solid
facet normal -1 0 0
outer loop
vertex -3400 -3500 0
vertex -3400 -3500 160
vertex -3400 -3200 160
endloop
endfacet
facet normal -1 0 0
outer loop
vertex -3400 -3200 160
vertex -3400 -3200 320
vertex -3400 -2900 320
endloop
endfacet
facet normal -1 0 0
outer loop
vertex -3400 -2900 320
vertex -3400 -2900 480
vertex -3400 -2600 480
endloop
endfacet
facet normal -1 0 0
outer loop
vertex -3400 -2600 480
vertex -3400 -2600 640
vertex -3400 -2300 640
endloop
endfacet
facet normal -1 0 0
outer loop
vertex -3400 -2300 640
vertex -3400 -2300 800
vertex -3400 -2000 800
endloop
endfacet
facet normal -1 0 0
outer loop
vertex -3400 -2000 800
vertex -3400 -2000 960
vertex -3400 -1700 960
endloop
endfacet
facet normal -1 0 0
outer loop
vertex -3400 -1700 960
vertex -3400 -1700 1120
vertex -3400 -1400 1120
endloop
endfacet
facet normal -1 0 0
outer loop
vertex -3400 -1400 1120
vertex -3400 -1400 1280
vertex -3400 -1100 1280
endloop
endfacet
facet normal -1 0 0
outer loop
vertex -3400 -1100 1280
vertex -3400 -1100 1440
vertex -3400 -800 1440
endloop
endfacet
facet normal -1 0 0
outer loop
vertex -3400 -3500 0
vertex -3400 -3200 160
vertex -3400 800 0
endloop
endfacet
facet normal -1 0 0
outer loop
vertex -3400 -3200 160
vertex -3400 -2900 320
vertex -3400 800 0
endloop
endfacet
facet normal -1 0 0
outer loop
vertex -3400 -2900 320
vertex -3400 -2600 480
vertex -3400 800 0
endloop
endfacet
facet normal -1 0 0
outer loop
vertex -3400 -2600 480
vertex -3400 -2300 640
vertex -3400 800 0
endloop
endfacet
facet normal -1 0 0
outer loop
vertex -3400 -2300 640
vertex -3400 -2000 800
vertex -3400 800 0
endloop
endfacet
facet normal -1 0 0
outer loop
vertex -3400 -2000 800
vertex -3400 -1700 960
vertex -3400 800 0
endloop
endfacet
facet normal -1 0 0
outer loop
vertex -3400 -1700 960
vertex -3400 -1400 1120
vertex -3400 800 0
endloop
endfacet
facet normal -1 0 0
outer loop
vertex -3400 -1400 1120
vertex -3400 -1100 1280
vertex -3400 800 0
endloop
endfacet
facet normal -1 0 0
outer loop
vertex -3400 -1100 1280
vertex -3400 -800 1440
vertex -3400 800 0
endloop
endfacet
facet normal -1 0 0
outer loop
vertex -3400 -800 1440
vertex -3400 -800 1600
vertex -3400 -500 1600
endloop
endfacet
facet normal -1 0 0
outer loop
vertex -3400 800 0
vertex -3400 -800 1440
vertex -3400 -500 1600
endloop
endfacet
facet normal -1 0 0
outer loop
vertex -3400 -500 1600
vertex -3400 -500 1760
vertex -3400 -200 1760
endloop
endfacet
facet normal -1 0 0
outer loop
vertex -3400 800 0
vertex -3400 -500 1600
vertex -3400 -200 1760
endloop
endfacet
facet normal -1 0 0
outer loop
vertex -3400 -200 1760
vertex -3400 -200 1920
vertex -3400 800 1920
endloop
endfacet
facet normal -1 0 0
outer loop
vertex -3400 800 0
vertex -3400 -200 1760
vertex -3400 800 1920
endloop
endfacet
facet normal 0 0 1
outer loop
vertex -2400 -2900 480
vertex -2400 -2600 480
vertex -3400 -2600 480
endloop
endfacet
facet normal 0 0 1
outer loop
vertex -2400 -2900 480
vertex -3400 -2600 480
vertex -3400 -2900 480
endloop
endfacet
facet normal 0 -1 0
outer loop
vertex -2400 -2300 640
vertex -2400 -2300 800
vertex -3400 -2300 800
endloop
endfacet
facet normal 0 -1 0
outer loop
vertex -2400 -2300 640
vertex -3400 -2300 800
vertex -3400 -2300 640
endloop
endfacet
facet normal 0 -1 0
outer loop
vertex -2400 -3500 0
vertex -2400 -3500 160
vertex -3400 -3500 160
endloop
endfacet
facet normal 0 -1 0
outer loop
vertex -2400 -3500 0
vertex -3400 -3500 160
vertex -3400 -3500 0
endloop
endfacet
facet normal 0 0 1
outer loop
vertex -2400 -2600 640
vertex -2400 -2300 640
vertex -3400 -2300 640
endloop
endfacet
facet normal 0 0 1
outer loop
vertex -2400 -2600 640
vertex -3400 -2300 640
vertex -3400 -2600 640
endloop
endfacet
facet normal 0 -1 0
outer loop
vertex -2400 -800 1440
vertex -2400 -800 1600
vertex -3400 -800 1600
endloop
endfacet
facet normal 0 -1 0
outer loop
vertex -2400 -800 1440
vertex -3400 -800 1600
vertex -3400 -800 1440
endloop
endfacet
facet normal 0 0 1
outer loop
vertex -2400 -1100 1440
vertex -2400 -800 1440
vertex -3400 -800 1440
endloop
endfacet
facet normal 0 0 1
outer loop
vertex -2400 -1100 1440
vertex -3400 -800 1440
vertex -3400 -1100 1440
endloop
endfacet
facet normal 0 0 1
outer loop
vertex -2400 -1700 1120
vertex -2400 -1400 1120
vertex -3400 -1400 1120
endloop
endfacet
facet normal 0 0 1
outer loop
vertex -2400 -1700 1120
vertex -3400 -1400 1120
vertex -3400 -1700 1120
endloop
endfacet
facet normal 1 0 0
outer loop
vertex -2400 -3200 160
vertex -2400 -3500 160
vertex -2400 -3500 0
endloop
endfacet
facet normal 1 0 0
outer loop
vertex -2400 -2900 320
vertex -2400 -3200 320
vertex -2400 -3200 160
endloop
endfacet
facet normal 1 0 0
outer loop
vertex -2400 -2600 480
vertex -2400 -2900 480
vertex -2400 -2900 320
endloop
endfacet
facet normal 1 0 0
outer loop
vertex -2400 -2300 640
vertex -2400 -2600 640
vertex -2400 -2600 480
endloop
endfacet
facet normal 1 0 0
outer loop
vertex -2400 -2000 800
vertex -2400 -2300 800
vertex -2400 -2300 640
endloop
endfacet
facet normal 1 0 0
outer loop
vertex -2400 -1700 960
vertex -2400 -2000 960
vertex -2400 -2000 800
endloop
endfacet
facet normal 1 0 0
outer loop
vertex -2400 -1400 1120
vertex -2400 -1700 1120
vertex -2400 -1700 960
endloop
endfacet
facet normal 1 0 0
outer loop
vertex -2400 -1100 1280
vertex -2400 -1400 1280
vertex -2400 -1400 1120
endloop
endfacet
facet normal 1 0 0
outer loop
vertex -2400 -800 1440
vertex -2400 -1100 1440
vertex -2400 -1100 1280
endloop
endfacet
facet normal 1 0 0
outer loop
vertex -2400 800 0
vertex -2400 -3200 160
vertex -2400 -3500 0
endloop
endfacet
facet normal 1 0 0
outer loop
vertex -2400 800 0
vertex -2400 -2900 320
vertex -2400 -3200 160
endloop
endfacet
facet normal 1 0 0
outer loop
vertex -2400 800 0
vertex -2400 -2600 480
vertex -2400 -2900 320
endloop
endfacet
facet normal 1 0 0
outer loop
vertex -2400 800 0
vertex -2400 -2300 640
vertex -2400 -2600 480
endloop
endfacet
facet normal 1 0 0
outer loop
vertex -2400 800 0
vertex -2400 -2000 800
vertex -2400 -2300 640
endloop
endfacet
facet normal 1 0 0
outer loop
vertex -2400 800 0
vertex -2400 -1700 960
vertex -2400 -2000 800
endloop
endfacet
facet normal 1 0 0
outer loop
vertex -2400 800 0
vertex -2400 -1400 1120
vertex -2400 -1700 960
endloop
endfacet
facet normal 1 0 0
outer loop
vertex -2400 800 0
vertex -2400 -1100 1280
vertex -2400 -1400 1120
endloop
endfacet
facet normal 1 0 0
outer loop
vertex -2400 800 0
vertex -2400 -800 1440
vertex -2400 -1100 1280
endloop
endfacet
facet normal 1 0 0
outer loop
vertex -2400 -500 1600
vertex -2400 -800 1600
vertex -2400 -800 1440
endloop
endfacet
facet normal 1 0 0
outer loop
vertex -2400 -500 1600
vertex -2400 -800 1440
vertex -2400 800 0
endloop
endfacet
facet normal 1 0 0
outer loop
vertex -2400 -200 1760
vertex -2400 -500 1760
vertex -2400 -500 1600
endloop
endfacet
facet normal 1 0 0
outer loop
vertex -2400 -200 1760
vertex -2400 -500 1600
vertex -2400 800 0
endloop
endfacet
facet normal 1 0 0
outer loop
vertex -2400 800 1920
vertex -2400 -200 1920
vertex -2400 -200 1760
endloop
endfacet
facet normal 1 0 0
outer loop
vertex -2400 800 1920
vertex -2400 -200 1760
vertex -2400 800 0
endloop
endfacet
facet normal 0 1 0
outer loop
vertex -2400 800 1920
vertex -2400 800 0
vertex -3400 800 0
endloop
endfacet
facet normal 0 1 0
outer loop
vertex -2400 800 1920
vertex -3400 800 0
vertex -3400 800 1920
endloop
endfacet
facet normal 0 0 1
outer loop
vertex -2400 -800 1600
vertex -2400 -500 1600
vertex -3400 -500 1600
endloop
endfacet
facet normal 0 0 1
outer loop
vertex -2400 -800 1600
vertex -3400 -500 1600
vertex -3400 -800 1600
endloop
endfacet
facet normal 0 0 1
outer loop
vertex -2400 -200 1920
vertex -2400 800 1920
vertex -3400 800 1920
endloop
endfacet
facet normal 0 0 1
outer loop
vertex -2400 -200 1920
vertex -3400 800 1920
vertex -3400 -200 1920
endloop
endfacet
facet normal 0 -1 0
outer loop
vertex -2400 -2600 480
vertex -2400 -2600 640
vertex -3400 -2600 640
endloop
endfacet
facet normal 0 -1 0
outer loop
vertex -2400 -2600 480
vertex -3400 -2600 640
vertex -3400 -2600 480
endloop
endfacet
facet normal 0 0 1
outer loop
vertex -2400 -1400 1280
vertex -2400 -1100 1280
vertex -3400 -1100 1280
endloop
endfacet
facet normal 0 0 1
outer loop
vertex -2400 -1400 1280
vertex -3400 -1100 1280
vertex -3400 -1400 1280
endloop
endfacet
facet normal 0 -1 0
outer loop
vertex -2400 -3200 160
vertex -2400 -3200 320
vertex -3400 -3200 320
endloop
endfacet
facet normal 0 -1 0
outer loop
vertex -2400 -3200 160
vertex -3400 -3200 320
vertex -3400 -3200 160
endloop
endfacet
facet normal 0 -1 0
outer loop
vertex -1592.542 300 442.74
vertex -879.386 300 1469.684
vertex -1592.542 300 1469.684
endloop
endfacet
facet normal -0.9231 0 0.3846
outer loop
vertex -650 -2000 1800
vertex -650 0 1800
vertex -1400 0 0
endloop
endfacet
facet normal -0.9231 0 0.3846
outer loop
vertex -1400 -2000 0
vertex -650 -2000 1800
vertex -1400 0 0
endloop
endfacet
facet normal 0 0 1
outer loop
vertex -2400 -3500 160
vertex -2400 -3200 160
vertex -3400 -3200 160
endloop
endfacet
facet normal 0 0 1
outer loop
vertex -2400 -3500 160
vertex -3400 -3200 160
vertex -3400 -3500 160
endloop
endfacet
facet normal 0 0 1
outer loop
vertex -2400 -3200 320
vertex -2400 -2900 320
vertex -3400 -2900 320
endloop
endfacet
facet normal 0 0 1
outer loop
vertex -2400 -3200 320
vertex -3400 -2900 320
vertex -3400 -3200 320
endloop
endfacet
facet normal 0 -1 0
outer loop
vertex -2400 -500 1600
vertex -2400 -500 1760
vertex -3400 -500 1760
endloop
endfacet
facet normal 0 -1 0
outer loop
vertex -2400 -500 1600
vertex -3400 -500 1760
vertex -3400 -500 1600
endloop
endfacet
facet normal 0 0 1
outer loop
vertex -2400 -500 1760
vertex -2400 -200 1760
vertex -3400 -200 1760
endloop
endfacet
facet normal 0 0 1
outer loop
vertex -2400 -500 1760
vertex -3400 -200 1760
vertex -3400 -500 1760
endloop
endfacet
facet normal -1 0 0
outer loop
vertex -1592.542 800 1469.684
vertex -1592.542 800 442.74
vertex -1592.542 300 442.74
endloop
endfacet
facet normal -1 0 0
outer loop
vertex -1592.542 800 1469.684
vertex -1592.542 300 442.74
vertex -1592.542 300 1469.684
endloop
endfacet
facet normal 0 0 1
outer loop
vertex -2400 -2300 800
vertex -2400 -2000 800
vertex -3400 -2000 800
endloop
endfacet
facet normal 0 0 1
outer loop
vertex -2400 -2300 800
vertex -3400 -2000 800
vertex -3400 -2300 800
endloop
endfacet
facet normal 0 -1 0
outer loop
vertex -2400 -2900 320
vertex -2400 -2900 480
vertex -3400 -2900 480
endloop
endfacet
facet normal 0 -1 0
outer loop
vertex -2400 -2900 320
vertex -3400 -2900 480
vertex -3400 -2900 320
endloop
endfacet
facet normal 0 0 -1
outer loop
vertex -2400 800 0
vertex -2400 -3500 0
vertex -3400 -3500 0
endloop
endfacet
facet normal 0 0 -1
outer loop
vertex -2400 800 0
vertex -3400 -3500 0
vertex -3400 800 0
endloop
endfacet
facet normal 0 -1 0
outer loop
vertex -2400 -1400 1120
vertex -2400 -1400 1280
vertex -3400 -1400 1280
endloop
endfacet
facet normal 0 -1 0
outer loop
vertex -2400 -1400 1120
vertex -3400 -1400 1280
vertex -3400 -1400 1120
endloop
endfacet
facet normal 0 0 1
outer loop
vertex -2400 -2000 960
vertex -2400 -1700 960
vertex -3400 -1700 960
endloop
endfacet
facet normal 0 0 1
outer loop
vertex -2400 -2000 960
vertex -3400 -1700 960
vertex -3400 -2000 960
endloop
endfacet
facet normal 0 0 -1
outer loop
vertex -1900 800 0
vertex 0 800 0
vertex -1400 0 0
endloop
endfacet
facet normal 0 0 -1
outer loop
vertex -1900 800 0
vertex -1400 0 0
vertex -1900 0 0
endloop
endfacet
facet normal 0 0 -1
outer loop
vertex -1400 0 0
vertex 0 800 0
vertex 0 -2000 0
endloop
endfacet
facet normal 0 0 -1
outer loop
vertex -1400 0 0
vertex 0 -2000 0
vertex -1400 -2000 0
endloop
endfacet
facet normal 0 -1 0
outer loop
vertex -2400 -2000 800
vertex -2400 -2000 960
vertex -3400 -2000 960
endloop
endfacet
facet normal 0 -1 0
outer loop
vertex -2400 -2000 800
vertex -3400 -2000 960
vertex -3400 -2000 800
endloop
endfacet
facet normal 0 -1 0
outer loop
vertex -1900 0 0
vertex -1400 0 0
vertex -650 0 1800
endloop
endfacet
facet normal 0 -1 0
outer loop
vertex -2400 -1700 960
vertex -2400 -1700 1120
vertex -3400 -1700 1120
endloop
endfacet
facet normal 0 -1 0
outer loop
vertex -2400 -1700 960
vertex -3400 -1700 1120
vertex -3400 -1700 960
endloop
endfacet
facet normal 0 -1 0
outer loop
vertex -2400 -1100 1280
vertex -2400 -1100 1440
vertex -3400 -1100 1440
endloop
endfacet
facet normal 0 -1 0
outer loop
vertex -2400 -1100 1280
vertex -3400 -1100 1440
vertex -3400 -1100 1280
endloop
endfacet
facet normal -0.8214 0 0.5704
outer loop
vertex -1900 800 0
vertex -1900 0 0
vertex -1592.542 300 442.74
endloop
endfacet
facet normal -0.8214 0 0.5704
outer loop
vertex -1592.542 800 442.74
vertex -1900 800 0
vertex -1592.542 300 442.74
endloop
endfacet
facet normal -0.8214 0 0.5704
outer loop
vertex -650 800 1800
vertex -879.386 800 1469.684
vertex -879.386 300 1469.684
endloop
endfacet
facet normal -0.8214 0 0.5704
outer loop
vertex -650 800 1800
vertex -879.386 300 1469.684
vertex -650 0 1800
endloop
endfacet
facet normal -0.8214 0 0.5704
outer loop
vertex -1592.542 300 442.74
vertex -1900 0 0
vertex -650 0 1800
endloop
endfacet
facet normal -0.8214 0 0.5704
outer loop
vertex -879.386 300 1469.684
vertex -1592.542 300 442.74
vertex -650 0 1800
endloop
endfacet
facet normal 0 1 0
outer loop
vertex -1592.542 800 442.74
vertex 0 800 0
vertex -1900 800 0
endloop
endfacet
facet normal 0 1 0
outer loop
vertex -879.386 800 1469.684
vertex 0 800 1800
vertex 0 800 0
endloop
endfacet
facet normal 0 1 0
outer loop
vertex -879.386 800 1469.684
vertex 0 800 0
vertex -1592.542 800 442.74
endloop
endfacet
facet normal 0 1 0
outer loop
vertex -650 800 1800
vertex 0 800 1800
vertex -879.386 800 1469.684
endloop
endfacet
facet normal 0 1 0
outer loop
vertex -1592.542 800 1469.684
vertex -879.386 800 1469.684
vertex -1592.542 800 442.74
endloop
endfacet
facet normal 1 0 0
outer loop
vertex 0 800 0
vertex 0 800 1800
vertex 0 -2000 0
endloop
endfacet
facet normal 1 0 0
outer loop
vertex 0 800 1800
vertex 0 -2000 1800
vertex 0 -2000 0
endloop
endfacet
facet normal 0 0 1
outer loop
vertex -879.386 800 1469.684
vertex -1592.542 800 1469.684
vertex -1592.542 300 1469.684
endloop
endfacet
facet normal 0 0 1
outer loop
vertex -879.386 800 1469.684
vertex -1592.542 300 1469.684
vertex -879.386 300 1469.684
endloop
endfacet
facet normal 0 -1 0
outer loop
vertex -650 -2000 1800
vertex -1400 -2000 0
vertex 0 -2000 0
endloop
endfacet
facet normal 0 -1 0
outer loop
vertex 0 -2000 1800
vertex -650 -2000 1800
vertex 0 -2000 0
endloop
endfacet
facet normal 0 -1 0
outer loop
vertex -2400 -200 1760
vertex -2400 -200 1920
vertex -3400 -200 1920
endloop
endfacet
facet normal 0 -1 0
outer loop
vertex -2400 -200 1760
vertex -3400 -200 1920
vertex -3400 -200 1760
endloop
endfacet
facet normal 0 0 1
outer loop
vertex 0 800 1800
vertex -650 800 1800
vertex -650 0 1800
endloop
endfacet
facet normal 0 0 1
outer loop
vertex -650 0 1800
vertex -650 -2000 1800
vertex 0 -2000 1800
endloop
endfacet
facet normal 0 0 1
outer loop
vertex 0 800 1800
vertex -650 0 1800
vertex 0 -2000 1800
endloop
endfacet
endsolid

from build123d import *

# Parameters (mm, degrees)
F1_DEPTH = 2000
F3_DEPTH = 800
F7_DEPTH = 1000
F9_DEPTH = 500


with BuildPart() as f1:
    # F0 (on Front) → F1 (new body)
    with BuildSketch(Plane.XZ):
        Polygon((-1400, 0), (0, 0), (0, 1800), (-650, 1800), align=None)
    extrude(amount=F1_DEPTH)


with BuildPart() as f3:
    # F2 (on face) → F3 (new body)
    with BuildSketch(Plane(origin=(0, 0, 0), x_dir=(-1, 0, 0), z_dir=(0, 1, 0))):
        Polygon((650, 1800), (1400, 0), (1900, 0), align=None)
        Polygon((0, 1800), (0, 0), (1400, 0), (650, 1800), align=None)
    extrude(amount=F3_DEPTH)


with BuildPart() as f1_1:
    add(f1.part)

    # F4: union F3
    add(f3.part)

    # F8 (on face) → F9 (join)
    with BuildSketch(Plane(origin=(0, 800, 0), x_dir=(-1, 0, 0), z_dir=(0, 1, 0))):
        Polygon((1592.5415754318, 1469.6835279465), (879.3864389261, 1469.6835279465), (1592.5415754318, 442.7401313782), align=None)
    extrude(amount=-F9_DEPTH)


with BuildPart() as f7:
    # F6 (on offset) → F7 (new body)
    with BuildSketch(Plane.YZ.offset(-2400)):
        Polygon((-3500, 160), (-3500, 0), (800, 0), (800, 1920), (-200, 1920), (-200, 1760), (-500, 1760), (-500, 1600), (-800, 1600), (-800, 1440), (-1100, 1440), (-1100, 1280), (-1400, 1280), (-1400, 1120), (-1700, 1120), (-1700, 960), (-2000, 960), (-2000, 800), (-2300, 800), (-2300, 640), (-2600, 640), (-2600, 480), (-2900, 480), (-2900, 320), (-3200, 320), (-3200, 160), align=None)
    extrude(amount=-F7_DEPTH)


solid = Compound([f1_1.part, f7.part])
